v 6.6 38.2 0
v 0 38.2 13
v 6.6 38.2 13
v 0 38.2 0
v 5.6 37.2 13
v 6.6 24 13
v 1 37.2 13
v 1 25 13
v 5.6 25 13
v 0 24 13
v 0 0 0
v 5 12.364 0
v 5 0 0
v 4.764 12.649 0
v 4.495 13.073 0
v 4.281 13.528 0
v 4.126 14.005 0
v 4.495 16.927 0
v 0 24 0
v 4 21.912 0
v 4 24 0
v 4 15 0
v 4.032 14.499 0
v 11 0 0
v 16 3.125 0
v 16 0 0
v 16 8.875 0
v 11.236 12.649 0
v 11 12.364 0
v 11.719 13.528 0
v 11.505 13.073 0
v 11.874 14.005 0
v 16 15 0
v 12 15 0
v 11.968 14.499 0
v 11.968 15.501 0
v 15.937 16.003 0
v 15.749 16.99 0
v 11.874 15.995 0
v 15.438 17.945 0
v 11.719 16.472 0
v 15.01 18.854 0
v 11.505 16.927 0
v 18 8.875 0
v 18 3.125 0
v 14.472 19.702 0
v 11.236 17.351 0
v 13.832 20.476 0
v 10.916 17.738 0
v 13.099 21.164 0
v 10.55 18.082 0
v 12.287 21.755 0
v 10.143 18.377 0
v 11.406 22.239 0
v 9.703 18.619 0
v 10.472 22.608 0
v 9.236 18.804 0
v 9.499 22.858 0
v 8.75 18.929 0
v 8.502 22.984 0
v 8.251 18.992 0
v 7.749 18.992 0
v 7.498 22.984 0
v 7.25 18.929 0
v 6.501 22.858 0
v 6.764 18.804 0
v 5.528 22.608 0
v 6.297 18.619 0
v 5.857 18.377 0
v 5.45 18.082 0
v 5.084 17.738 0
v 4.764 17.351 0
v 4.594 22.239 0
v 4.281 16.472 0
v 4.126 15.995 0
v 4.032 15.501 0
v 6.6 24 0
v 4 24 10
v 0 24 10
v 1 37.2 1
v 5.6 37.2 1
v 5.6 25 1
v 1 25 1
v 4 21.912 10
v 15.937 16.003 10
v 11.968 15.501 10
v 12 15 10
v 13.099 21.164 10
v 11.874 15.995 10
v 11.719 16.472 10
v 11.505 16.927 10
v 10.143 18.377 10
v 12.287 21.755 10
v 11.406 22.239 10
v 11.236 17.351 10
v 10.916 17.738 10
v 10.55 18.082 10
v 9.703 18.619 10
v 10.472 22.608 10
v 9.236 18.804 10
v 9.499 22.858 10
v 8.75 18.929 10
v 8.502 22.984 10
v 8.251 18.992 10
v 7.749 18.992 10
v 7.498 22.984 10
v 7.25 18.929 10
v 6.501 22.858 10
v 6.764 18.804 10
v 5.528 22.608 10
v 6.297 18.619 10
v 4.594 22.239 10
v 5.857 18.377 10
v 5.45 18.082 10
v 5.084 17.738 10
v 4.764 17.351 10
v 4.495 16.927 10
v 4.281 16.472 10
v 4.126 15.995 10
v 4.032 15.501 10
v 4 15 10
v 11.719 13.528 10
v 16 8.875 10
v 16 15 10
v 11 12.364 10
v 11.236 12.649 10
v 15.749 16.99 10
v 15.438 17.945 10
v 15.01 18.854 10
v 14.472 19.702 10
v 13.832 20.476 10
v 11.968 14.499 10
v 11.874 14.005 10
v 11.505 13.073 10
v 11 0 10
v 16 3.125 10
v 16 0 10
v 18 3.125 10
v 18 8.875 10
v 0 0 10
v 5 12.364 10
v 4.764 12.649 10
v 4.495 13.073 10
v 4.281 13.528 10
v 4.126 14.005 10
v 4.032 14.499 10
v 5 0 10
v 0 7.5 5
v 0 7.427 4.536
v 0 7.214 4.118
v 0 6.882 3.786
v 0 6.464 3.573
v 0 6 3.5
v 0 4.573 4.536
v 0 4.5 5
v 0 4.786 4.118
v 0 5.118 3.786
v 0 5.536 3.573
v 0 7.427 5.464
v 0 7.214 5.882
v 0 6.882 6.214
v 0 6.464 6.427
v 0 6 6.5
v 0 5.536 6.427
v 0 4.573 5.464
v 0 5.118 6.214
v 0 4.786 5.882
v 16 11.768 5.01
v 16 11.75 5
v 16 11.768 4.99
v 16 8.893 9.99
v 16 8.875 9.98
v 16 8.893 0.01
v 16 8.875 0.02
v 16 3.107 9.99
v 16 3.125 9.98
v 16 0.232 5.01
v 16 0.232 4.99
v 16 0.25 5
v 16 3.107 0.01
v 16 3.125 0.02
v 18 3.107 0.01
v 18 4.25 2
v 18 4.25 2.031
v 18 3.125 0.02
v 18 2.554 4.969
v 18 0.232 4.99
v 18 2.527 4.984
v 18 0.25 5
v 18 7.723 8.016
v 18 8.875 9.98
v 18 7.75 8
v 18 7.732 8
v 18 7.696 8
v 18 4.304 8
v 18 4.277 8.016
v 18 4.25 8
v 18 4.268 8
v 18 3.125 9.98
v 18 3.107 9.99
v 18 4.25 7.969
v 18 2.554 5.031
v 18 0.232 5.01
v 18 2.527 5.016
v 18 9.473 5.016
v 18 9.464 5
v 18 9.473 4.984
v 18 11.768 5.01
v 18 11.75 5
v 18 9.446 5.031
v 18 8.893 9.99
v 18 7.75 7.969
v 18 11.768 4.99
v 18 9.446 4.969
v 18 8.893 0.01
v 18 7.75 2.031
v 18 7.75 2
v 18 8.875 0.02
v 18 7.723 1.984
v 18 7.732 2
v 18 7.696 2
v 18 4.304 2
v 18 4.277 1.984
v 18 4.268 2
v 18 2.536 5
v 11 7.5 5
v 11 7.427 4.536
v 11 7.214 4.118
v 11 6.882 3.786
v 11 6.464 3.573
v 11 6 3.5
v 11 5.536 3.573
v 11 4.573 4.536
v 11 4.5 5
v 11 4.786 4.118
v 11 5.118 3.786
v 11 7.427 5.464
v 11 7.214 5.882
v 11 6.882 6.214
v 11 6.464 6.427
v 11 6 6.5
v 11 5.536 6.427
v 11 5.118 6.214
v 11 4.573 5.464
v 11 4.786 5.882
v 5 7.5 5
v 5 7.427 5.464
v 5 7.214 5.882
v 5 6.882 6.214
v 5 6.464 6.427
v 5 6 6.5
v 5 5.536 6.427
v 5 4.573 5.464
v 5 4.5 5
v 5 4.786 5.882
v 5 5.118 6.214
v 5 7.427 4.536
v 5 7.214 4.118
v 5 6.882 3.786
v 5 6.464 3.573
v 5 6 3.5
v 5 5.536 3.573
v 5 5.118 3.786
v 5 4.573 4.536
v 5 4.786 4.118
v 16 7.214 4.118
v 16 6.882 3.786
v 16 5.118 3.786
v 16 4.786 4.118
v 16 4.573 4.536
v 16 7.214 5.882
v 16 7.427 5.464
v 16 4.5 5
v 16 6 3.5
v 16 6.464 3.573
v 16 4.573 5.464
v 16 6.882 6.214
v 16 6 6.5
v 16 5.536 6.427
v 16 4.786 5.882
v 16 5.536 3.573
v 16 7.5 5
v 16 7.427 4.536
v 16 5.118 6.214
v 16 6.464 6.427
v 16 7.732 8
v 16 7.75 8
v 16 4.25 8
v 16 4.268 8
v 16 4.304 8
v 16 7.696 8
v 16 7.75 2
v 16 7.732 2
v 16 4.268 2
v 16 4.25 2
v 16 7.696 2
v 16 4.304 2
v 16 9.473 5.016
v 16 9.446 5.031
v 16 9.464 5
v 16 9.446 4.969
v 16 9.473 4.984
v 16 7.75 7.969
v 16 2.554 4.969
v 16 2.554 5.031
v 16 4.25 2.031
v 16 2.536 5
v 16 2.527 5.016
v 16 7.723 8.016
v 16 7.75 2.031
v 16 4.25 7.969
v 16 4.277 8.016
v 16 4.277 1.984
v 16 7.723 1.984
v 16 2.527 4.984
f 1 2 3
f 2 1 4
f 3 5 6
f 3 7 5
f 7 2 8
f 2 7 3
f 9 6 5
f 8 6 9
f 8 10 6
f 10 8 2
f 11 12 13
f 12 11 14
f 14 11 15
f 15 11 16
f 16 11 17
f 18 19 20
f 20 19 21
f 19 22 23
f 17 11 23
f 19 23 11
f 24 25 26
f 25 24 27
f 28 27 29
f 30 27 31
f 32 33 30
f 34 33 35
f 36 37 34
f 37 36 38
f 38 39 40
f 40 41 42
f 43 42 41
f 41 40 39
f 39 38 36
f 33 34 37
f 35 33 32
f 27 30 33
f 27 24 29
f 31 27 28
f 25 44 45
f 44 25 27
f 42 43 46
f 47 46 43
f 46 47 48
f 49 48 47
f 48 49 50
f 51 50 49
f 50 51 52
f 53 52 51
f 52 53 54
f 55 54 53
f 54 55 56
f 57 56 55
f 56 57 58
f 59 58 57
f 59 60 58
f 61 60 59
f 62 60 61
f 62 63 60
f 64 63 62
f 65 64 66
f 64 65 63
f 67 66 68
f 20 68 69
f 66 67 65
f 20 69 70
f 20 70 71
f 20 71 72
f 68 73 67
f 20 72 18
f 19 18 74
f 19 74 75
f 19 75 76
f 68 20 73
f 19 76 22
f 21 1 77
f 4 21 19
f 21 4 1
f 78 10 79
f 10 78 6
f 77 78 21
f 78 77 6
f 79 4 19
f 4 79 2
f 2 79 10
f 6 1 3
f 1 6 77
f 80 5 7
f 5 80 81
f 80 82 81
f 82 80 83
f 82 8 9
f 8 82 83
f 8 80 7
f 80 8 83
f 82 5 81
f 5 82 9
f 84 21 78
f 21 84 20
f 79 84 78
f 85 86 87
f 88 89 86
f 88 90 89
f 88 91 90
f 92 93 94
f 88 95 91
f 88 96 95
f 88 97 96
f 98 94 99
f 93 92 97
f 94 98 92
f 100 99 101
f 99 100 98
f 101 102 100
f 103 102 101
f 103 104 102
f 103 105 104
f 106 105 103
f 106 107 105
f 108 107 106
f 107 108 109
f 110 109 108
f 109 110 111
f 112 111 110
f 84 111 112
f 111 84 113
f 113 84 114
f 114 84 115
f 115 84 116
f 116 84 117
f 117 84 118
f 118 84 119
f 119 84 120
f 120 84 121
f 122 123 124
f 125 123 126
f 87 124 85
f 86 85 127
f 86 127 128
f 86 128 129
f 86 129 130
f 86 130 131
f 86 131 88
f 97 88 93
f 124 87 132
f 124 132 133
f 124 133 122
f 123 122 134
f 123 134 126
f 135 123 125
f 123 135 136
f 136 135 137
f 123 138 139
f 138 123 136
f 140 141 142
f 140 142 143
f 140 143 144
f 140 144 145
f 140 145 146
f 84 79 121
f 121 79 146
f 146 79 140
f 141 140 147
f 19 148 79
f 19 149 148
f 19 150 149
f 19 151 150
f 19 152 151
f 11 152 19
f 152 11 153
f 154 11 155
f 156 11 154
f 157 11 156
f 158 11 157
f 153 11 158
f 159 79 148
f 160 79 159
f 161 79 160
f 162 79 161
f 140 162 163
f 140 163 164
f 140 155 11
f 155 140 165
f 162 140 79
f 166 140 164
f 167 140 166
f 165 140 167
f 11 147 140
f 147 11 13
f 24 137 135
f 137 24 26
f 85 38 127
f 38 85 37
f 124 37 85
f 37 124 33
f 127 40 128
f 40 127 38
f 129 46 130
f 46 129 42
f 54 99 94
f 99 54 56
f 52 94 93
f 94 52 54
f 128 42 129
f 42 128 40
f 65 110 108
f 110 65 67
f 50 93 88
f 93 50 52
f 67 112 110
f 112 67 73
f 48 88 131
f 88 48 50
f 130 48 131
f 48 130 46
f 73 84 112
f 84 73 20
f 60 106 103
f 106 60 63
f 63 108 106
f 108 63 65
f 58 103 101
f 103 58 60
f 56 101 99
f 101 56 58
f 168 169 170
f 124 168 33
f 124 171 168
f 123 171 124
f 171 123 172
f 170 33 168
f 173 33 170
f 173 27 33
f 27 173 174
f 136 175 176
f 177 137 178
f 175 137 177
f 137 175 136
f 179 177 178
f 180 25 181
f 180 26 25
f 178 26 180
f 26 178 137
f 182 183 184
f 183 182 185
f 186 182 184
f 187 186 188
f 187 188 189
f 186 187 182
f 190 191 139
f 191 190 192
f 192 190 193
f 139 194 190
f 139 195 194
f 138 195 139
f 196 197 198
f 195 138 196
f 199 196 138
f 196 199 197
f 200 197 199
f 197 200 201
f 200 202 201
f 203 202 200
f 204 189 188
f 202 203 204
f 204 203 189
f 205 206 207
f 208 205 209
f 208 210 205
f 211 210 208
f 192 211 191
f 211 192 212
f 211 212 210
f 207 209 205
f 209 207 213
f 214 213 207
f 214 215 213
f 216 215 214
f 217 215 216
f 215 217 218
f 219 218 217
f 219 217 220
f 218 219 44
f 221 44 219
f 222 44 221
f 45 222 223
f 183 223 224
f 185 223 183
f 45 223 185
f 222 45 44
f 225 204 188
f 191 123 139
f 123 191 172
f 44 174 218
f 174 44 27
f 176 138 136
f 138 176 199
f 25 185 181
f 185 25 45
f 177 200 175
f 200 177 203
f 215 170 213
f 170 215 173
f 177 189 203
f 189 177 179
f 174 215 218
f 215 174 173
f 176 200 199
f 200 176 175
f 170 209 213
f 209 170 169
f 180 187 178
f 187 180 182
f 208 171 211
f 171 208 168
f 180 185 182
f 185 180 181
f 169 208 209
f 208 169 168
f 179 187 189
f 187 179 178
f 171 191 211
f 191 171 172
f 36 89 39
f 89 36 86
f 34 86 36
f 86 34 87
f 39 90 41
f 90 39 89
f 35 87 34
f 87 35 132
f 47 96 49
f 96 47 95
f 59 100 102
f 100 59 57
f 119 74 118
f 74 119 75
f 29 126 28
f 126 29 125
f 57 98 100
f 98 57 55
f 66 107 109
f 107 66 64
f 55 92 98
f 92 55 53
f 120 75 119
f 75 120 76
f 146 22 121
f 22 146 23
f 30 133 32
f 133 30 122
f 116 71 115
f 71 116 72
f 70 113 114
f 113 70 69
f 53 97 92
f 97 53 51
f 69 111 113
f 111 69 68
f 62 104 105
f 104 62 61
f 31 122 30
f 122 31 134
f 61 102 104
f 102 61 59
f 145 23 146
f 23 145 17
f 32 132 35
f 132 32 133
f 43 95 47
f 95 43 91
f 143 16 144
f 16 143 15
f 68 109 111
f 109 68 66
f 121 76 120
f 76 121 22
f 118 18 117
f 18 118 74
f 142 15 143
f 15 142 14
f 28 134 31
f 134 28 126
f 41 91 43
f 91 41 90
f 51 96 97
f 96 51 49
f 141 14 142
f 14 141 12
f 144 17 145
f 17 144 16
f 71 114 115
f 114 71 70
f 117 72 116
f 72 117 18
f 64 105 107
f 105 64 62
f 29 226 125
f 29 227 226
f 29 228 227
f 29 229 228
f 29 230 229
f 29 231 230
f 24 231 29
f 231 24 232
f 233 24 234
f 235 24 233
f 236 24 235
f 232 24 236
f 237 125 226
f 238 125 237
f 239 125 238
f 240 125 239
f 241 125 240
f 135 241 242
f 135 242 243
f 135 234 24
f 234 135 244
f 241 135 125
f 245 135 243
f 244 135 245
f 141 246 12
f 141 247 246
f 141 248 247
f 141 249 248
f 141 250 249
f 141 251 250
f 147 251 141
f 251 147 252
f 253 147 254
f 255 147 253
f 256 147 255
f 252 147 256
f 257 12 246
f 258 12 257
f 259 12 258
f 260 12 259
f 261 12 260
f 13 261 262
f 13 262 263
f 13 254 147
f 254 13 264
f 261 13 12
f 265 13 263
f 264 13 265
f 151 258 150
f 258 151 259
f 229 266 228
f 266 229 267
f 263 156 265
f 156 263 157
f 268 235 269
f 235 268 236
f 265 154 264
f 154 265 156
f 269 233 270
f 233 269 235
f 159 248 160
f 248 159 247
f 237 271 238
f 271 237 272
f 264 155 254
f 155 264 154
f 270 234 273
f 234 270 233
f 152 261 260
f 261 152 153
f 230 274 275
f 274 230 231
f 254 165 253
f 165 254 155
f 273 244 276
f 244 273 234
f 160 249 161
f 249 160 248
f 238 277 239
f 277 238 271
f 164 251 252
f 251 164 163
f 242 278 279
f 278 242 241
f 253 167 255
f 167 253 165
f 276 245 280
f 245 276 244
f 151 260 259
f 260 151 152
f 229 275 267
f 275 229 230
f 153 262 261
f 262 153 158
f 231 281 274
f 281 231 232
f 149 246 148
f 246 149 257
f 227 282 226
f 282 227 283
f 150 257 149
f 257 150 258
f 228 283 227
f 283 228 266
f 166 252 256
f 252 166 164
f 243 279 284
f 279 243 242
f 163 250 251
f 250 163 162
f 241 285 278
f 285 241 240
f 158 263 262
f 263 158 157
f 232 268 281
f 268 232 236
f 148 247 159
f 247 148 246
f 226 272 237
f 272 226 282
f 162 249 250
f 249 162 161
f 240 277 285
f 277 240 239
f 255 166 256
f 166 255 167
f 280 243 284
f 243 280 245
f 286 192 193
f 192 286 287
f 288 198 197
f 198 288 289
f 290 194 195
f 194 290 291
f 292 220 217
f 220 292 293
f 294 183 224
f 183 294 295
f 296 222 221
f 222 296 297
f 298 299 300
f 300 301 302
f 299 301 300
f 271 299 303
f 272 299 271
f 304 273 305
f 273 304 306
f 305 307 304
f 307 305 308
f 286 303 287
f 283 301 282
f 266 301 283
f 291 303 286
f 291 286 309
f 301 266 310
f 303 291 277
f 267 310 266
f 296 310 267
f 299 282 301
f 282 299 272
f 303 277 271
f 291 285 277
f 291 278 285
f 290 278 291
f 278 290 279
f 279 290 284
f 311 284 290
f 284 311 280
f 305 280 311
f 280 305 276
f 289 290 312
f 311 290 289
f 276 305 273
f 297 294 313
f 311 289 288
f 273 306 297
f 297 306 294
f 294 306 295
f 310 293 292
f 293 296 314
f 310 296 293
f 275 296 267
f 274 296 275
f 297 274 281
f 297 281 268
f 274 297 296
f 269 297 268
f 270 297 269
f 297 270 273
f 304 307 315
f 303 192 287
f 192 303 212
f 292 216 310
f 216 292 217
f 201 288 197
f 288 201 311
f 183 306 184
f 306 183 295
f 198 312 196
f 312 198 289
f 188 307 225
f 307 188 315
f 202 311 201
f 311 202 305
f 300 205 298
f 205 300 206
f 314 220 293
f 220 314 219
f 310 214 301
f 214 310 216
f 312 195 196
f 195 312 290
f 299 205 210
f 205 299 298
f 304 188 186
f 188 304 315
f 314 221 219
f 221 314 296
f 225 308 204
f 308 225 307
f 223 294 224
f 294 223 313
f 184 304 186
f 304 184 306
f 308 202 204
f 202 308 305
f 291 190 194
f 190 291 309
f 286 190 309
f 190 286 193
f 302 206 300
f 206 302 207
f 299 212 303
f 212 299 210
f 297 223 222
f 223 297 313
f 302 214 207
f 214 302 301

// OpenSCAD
extra=0.1;
H=12;
L=4.5+extra;
B=12.1+extra;
union(){
rotate([0,0,90])
translate([24,-(L+2),0])
difference()
{

cube([B+2,L+2,H+1]);
translate([1,1,1])
cube([B,L,H+2]);
}

difference() {
	union() {
		cube([4,24,10]);  //4,45,10
		translate([8, 15,0]) cylinder(h = 10, r = 8, $fn = 50);
		cube([16, 15,10]);
		
		translate([17,6,5]) cube([2,5.75,10], center=true);
		translate([17,6,5]) rotate(a=[60,0,0]) cube([2,5.75,10], center=true);
		translate([17,6,5]) rotate(a=[120,0,0]) cube([2,5.75,10], center=true);

	}
	translate([8, 15,0]) cylinder(h = 10, r = 4, $fn = 50);
	translate([5, 0, 0]) cube([6, 15,10]);
	translate([-10, 6, 5]) rotate(a=[0, 90, 0]) cylinder(h = 30, r = 1.5, $fn= 20);

	translate([17,6,5]) cube([2,3.5,6], center=true);
	translate([17,6,5]) rotate(a=[60,0,0]) cube([2,3.5,6], center=true);
	translate([17,6,5]) rotate(a=[120,0,0]) cube([2,3.5,6], center=true);
}
}
